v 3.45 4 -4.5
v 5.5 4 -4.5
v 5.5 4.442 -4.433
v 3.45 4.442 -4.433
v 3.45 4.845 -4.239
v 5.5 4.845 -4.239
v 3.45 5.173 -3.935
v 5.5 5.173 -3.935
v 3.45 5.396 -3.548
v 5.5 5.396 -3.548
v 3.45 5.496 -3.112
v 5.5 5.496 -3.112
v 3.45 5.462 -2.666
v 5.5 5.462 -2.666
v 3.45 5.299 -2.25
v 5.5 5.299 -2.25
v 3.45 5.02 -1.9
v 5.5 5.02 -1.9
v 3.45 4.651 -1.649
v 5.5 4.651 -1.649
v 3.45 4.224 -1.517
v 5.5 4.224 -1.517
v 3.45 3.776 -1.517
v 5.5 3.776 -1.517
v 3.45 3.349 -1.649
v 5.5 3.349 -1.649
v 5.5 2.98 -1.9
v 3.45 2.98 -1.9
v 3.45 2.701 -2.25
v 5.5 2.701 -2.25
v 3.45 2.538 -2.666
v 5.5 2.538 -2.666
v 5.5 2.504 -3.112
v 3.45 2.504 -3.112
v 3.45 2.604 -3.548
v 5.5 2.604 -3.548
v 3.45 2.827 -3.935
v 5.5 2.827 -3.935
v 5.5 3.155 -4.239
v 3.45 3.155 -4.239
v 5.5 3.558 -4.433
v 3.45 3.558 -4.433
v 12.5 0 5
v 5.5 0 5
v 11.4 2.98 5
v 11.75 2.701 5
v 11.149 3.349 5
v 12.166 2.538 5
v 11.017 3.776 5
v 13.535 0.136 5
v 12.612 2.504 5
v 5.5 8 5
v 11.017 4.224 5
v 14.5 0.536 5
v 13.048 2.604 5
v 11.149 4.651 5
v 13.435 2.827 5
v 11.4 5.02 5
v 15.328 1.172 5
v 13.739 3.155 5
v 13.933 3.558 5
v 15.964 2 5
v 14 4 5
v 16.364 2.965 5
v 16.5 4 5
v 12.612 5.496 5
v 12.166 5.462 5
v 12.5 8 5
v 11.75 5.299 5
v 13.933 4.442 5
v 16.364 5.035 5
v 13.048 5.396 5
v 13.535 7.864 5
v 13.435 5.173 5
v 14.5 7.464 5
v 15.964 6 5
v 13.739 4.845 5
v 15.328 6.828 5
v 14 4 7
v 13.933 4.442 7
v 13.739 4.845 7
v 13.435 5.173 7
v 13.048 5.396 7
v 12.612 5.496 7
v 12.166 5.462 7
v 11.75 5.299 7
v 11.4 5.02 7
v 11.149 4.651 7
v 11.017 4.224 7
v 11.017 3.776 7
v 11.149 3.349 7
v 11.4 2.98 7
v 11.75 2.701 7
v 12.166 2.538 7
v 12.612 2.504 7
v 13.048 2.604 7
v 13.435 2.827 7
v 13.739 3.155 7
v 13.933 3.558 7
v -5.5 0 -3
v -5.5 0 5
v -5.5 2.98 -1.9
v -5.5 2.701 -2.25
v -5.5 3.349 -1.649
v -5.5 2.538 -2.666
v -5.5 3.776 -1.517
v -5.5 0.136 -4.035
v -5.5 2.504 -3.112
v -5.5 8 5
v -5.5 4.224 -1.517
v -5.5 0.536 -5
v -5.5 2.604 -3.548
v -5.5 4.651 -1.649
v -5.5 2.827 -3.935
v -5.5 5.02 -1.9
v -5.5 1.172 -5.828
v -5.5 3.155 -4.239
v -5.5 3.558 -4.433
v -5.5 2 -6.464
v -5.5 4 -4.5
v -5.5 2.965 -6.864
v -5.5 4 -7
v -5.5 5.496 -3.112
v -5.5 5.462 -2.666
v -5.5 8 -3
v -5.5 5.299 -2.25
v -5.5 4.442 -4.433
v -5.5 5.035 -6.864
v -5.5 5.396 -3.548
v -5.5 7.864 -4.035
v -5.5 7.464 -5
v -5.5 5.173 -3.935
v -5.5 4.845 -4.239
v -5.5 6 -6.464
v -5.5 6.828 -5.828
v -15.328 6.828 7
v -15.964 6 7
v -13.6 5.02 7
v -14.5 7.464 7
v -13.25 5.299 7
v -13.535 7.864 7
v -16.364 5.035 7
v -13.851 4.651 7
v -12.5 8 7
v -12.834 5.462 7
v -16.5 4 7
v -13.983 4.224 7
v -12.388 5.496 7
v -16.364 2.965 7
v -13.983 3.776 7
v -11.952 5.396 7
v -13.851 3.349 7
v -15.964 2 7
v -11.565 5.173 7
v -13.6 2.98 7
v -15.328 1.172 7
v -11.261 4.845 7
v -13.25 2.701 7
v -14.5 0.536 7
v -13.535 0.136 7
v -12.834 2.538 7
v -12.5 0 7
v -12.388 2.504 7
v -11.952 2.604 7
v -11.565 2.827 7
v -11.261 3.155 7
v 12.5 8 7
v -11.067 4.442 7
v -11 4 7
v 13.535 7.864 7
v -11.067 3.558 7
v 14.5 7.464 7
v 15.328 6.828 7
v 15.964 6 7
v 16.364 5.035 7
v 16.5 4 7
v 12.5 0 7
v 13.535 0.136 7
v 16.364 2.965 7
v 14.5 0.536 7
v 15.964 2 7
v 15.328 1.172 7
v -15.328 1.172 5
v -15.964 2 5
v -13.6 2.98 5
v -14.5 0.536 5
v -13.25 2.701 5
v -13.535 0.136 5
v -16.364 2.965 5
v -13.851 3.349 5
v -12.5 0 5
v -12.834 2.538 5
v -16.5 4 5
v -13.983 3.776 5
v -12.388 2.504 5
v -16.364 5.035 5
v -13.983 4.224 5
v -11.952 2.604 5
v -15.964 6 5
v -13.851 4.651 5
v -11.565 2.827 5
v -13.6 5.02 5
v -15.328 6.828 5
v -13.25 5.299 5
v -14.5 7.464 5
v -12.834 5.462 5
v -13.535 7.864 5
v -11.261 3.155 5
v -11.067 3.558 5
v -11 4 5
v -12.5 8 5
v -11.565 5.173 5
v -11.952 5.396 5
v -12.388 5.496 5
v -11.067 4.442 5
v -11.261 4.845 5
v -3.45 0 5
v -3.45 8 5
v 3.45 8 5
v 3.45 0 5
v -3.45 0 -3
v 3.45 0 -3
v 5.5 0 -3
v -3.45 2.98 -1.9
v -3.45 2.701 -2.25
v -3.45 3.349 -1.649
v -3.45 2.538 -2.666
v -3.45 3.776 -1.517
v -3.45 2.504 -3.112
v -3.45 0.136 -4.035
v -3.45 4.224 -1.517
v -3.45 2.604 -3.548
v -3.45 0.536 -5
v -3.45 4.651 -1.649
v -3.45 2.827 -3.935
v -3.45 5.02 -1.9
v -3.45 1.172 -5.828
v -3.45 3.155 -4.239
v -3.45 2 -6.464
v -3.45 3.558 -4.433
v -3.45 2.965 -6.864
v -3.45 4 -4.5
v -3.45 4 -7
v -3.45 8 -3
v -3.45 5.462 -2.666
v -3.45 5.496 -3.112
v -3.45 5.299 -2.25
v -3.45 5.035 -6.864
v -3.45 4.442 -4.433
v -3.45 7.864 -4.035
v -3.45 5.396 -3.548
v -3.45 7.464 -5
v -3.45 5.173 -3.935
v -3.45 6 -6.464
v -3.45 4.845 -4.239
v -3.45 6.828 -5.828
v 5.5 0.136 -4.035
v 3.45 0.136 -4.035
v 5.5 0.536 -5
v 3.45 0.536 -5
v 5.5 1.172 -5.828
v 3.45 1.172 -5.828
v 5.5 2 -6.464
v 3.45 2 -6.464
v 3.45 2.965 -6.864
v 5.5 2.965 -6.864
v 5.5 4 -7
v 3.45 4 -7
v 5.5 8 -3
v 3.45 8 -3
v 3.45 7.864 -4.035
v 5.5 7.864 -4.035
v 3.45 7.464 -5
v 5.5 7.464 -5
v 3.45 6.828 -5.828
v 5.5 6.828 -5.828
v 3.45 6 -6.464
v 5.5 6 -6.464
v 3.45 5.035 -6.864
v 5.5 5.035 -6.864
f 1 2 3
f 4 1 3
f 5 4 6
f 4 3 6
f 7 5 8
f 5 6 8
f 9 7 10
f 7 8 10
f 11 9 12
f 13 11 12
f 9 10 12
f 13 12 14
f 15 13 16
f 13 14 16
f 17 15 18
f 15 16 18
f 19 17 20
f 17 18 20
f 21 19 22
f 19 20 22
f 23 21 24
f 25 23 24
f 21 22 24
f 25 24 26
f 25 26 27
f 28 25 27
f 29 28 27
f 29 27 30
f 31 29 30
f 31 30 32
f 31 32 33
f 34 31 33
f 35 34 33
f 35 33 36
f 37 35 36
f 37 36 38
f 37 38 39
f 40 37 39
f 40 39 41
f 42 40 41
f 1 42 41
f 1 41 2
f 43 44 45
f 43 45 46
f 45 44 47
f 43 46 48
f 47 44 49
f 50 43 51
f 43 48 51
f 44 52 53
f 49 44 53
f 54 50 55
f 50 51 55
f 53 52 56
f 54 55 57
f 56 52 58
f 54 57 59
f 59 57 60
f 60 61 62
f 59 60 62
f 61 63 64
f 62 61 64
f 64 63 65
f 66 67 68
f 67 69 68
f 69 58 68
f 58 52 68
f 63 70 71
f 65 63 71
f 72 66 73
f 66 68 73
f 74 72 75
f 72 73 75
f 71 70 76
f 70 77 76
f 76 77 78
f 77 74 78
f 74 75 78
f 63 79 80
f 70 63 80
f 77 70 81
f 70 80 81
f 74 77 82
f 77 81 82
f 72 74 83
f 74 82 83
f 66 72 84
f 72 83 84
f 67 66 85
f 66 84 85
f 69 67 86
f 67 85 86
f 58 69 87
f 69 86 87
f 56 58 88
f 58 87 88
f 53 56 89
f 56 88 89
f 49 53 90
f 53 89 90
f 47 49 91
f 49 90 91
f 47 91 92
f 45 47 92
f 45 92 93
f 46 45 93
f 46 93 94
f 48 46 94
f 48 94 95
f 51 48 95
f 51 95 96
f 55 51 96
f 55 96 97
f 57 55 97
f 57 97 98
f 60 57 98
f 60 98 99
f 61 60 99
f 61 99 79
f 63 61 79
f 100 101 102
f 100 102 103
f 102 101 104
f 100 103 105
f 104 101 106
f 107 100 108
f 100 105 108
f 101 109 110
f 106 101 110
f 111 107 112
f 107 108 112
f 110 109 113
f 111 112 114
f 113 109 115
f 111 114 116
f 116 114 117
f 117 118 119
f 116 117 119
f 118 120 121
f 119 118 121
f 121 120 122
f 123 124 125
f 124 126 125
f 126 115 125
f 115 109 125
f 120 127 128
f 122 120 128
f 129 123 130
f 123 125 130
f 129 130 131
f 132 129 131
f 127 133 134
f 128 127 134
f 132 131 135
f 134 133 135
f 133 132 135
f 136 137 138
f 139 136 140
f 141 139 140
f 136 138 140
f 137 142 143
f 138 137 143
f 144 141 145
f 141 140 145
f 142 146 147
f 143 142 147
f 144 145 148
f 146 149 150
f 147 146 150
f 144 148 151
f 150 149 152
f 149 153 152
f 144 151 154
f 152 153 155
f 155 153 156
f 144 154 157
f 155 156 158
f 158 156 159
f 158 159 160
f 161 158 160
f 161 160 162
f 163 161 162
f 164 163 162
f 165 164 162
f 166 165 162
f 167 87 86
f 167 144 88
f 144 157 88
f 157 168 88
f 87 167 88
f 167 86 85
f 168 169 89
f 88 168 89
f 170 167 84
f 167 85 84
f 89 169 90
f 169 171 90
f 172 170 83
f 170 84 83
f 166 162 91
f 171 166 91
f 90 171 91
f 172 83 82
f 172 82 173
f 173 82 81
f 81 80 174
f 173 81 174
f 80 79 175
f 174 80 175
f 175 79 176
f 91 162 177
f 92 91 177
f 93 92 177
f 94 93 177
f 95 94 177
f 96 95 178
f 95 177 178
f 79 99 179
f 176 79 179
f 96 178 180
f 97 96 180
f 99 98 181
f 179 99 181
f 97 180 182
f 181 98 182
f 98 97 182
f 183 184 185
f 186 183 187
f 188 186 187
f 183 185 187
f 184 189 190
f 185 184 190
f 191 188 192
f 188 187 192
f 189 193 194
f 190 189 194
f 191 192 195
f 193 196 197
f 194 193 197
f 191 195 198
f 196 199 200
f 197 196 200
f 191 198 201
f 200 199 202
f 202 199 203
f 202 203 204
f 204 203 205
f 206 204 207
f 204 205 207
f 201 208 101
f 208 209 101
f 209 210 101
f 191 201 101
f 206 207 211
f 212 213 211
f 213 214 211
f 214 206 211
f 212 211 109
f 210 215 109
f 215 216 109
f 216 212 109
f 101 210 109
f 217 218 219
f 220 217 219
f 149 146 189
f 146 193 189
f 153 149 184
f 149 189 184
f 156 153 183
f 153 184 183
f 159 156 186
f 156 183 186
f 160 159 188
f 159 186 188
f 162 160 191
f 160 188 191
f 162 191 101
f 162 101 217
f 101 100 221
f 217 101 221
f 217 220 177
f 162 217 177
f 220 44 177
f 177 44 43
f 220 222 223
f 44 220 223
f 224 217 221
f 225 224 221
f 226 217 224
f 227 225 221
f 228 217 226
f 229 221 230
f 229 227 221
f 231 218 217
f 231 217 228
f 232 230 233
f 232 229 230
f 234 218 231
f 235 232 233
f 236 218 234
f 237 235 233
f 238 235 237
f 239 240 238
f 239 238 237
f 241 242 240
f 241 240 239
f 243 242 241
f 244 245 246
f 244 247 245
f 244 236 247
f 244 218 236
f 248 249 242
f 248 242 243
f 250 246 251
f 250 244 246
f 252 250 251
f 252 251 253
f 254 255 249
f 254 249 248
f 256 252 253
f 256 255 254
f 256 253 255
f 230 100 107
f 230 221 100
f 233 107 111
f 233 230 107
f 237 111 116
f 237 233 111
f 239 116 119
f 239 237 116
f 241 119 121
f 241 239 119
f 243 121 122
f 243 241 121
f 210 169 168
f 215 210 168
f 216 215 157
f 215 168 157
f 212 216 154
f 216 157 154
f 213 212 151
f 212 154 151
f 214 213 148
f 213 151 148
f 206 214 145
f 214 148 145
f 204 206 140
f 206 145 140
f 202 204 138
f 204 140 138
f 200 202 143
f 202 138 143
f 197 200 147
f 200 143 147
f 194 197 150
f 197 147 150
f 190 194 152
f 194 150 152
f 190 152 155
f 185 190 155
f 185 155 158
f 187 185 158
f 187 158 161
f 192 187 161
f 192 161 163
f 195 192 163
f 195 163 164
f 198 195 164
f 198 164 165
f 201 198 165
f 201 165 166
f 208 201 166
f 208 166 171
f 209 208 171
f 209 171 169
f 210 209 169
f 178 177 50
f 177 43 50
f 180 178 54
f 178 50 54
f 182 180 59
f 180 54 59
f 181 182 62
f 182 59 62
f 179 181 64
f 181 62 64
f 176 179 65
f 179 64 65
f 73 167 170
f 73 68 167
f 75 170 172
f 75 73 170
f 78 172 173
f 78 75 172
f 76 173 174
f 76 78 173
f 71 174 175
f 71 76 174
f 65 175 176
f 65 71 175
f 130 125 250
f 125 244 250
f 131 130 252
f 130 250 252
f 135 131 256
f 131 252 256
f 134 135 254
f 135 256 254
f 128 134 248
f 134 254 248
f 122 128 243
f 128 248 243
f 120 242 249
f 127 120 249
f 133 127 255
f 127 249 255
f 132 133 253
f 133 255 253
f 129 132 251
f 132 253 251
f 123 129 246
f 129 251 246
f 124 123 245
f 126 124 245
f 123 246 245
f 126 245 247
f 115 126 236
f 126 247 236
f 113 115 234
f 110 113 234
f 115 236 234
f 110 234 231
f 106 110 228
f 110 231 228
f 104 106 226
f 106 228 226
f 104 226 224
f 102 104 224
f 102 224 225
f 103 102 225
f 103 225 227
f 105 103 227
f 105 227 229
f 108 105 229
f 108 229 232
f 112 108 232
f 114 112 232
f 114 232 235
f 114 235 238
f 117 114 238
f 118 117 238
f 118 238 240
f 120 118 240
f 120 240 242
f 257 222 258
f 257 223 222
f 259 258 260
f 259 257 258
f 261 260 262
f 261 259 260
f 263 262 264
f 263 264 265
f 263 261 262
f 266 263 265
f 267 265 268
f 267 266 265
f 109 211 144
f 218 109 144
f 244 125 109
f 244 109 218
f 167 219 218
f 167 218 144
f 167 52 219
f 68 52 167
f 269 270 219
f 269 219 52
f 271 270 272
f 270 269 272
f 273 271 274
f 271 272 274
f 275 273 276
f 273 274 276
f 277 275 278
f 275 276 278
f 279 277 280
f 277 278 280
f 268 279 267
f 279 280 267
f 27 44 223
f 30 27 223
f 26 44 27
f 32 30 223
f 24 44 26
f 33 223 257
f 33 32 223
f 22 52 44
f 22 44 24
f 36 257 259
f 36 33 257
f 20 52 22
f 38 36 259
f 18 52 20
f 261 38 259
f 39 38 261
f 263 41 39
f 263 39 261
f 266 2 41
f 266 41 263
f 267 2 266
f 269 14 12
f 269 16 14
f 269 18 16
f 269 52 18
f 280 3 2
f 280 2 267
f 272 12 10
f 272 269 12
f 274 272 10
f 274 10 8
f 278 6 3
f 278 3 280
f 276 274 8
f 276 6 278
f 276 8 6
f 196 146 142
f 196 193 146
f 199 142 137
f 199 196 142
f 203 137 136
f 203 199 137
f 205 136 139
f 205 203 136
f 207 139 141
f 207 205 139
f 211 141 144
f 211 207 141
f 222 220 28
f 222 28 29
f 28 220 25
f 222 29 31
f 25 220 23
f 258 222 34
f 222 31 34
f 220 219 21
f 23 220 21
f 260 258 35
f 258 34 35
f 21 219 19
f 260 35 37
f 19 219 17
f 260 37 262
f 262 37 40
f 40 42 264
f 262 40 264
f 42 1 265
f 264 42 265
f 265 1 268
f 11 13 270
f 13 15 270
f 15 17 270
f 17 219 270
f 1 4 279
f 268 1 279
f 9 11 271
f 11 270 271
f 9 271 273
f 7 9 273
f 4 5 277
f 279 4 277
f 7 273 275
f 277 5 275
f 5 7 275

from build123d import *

# Parameters (mm, degrees)
SKETCH_1_W          = 33
SKETCH_1_H          = 14
EXTRUDE_1_DEPTH     = 8
SKETCH_2_W          = 11
SKETCH_2_H          = 12
SKETCH_2_W_2        = 6.9
CUT_EXTRUDE_1_DEPTH = 20.627786426
FILLET_1_R          = 4
FILLET_2_R          = 4
SKETCH_3_R          = 1.5
CUT_EXTRUDE_2_DEPTH = 11
SKETCH_4_R          = 1.5
CUT_EXTRUDE_3_DEPTH = 24.07054399


with BuildPart() as part:
    # 草图1 → 凸台-拉伸1 (new body)
    with BuildSketch(Plane(origin=(0, 0, 0), x_dir=(1, 0, 0), z_dir=(0, 1, 0))):
        Rectangle(SKETCH_1_W, SKETCH_1_H)
    extrude(amount=EXTRUDE_1_DEPTH)

    # 草图2 → 切除-拉伸1 (cut, through all)
    with BuildSketch(Plane(origin=(0, 8, 0), x_dir=(1, 0, 0), z_dir=(0, 1, 0))):
        with Locations((-11, 1)):
            Rectangle(SKETCH_2_W, SKETCH_2_H)
        with Locations((11, 1)):
            Rectangle(SKETCH_2_W, SKETCH_2_H)
        with Locations((0, 1)):
            Rectangle(SKETCH_2_W_2, SKETCH_2_H)
    extrude(amount=-CUT_EXTRUDE_1_DEPTH, mode=Mode.SUBTRACT)

    # 圆角1
    fillet_1_edges = [part.edges().sort_by_distance(p)[0] for p in [
        (16.5, 0, 6),
        (16.5, 8, 6),
        (-16.5, 0, 6),
        (-16.5, 8, 6),
    ]]
    fillet(fillet_1_edges, radius=FILLET_1_R - 0.0001)  # a hair under: the kernel refuses the full size

    # 圆角2
    fillet_2_edges = [part.edges().sort_by_distance(p)[0] for p in [
        (-4.475, 8, -7),
        (-4.475, 0, -7),
        (4.475, 0, -7),
        (4.475, 8, -7),
    ]]
    fillet(fillet_2_edges, radius=FILLET_2_R - 0.0001)  # a hair under: the kernel refuses the full size

    # 草图3 → 切除-拉伸2 (cut)
    with BuildSketch(Plane(origin=(5.5, 0, 0), x_dir=(0, 0, -1), z_dir=(1, 0, 0))):
        with Locations((3, 4)):
            Circle(SKETCH_3_R)
    extrude(amount=-CUT_EXTRUDE_2_DEPTH, mode=Mode.SUBTRACT)

    # 草图4 → 切除-拉伸3 (cut, through all)
    with BuildSketch(Plane.XY.offset(7)):
        with Locations((12.5, 4)):
            Circle(SKETCH_4_R)
        with Locations((-12.5, 4)):
            Circle(SKETCH_4_R)
    extrude(amount=-CUT_EXTRUDE_3_DEPTH, mode=Mode.SUBTRACT)


solid = part.part
